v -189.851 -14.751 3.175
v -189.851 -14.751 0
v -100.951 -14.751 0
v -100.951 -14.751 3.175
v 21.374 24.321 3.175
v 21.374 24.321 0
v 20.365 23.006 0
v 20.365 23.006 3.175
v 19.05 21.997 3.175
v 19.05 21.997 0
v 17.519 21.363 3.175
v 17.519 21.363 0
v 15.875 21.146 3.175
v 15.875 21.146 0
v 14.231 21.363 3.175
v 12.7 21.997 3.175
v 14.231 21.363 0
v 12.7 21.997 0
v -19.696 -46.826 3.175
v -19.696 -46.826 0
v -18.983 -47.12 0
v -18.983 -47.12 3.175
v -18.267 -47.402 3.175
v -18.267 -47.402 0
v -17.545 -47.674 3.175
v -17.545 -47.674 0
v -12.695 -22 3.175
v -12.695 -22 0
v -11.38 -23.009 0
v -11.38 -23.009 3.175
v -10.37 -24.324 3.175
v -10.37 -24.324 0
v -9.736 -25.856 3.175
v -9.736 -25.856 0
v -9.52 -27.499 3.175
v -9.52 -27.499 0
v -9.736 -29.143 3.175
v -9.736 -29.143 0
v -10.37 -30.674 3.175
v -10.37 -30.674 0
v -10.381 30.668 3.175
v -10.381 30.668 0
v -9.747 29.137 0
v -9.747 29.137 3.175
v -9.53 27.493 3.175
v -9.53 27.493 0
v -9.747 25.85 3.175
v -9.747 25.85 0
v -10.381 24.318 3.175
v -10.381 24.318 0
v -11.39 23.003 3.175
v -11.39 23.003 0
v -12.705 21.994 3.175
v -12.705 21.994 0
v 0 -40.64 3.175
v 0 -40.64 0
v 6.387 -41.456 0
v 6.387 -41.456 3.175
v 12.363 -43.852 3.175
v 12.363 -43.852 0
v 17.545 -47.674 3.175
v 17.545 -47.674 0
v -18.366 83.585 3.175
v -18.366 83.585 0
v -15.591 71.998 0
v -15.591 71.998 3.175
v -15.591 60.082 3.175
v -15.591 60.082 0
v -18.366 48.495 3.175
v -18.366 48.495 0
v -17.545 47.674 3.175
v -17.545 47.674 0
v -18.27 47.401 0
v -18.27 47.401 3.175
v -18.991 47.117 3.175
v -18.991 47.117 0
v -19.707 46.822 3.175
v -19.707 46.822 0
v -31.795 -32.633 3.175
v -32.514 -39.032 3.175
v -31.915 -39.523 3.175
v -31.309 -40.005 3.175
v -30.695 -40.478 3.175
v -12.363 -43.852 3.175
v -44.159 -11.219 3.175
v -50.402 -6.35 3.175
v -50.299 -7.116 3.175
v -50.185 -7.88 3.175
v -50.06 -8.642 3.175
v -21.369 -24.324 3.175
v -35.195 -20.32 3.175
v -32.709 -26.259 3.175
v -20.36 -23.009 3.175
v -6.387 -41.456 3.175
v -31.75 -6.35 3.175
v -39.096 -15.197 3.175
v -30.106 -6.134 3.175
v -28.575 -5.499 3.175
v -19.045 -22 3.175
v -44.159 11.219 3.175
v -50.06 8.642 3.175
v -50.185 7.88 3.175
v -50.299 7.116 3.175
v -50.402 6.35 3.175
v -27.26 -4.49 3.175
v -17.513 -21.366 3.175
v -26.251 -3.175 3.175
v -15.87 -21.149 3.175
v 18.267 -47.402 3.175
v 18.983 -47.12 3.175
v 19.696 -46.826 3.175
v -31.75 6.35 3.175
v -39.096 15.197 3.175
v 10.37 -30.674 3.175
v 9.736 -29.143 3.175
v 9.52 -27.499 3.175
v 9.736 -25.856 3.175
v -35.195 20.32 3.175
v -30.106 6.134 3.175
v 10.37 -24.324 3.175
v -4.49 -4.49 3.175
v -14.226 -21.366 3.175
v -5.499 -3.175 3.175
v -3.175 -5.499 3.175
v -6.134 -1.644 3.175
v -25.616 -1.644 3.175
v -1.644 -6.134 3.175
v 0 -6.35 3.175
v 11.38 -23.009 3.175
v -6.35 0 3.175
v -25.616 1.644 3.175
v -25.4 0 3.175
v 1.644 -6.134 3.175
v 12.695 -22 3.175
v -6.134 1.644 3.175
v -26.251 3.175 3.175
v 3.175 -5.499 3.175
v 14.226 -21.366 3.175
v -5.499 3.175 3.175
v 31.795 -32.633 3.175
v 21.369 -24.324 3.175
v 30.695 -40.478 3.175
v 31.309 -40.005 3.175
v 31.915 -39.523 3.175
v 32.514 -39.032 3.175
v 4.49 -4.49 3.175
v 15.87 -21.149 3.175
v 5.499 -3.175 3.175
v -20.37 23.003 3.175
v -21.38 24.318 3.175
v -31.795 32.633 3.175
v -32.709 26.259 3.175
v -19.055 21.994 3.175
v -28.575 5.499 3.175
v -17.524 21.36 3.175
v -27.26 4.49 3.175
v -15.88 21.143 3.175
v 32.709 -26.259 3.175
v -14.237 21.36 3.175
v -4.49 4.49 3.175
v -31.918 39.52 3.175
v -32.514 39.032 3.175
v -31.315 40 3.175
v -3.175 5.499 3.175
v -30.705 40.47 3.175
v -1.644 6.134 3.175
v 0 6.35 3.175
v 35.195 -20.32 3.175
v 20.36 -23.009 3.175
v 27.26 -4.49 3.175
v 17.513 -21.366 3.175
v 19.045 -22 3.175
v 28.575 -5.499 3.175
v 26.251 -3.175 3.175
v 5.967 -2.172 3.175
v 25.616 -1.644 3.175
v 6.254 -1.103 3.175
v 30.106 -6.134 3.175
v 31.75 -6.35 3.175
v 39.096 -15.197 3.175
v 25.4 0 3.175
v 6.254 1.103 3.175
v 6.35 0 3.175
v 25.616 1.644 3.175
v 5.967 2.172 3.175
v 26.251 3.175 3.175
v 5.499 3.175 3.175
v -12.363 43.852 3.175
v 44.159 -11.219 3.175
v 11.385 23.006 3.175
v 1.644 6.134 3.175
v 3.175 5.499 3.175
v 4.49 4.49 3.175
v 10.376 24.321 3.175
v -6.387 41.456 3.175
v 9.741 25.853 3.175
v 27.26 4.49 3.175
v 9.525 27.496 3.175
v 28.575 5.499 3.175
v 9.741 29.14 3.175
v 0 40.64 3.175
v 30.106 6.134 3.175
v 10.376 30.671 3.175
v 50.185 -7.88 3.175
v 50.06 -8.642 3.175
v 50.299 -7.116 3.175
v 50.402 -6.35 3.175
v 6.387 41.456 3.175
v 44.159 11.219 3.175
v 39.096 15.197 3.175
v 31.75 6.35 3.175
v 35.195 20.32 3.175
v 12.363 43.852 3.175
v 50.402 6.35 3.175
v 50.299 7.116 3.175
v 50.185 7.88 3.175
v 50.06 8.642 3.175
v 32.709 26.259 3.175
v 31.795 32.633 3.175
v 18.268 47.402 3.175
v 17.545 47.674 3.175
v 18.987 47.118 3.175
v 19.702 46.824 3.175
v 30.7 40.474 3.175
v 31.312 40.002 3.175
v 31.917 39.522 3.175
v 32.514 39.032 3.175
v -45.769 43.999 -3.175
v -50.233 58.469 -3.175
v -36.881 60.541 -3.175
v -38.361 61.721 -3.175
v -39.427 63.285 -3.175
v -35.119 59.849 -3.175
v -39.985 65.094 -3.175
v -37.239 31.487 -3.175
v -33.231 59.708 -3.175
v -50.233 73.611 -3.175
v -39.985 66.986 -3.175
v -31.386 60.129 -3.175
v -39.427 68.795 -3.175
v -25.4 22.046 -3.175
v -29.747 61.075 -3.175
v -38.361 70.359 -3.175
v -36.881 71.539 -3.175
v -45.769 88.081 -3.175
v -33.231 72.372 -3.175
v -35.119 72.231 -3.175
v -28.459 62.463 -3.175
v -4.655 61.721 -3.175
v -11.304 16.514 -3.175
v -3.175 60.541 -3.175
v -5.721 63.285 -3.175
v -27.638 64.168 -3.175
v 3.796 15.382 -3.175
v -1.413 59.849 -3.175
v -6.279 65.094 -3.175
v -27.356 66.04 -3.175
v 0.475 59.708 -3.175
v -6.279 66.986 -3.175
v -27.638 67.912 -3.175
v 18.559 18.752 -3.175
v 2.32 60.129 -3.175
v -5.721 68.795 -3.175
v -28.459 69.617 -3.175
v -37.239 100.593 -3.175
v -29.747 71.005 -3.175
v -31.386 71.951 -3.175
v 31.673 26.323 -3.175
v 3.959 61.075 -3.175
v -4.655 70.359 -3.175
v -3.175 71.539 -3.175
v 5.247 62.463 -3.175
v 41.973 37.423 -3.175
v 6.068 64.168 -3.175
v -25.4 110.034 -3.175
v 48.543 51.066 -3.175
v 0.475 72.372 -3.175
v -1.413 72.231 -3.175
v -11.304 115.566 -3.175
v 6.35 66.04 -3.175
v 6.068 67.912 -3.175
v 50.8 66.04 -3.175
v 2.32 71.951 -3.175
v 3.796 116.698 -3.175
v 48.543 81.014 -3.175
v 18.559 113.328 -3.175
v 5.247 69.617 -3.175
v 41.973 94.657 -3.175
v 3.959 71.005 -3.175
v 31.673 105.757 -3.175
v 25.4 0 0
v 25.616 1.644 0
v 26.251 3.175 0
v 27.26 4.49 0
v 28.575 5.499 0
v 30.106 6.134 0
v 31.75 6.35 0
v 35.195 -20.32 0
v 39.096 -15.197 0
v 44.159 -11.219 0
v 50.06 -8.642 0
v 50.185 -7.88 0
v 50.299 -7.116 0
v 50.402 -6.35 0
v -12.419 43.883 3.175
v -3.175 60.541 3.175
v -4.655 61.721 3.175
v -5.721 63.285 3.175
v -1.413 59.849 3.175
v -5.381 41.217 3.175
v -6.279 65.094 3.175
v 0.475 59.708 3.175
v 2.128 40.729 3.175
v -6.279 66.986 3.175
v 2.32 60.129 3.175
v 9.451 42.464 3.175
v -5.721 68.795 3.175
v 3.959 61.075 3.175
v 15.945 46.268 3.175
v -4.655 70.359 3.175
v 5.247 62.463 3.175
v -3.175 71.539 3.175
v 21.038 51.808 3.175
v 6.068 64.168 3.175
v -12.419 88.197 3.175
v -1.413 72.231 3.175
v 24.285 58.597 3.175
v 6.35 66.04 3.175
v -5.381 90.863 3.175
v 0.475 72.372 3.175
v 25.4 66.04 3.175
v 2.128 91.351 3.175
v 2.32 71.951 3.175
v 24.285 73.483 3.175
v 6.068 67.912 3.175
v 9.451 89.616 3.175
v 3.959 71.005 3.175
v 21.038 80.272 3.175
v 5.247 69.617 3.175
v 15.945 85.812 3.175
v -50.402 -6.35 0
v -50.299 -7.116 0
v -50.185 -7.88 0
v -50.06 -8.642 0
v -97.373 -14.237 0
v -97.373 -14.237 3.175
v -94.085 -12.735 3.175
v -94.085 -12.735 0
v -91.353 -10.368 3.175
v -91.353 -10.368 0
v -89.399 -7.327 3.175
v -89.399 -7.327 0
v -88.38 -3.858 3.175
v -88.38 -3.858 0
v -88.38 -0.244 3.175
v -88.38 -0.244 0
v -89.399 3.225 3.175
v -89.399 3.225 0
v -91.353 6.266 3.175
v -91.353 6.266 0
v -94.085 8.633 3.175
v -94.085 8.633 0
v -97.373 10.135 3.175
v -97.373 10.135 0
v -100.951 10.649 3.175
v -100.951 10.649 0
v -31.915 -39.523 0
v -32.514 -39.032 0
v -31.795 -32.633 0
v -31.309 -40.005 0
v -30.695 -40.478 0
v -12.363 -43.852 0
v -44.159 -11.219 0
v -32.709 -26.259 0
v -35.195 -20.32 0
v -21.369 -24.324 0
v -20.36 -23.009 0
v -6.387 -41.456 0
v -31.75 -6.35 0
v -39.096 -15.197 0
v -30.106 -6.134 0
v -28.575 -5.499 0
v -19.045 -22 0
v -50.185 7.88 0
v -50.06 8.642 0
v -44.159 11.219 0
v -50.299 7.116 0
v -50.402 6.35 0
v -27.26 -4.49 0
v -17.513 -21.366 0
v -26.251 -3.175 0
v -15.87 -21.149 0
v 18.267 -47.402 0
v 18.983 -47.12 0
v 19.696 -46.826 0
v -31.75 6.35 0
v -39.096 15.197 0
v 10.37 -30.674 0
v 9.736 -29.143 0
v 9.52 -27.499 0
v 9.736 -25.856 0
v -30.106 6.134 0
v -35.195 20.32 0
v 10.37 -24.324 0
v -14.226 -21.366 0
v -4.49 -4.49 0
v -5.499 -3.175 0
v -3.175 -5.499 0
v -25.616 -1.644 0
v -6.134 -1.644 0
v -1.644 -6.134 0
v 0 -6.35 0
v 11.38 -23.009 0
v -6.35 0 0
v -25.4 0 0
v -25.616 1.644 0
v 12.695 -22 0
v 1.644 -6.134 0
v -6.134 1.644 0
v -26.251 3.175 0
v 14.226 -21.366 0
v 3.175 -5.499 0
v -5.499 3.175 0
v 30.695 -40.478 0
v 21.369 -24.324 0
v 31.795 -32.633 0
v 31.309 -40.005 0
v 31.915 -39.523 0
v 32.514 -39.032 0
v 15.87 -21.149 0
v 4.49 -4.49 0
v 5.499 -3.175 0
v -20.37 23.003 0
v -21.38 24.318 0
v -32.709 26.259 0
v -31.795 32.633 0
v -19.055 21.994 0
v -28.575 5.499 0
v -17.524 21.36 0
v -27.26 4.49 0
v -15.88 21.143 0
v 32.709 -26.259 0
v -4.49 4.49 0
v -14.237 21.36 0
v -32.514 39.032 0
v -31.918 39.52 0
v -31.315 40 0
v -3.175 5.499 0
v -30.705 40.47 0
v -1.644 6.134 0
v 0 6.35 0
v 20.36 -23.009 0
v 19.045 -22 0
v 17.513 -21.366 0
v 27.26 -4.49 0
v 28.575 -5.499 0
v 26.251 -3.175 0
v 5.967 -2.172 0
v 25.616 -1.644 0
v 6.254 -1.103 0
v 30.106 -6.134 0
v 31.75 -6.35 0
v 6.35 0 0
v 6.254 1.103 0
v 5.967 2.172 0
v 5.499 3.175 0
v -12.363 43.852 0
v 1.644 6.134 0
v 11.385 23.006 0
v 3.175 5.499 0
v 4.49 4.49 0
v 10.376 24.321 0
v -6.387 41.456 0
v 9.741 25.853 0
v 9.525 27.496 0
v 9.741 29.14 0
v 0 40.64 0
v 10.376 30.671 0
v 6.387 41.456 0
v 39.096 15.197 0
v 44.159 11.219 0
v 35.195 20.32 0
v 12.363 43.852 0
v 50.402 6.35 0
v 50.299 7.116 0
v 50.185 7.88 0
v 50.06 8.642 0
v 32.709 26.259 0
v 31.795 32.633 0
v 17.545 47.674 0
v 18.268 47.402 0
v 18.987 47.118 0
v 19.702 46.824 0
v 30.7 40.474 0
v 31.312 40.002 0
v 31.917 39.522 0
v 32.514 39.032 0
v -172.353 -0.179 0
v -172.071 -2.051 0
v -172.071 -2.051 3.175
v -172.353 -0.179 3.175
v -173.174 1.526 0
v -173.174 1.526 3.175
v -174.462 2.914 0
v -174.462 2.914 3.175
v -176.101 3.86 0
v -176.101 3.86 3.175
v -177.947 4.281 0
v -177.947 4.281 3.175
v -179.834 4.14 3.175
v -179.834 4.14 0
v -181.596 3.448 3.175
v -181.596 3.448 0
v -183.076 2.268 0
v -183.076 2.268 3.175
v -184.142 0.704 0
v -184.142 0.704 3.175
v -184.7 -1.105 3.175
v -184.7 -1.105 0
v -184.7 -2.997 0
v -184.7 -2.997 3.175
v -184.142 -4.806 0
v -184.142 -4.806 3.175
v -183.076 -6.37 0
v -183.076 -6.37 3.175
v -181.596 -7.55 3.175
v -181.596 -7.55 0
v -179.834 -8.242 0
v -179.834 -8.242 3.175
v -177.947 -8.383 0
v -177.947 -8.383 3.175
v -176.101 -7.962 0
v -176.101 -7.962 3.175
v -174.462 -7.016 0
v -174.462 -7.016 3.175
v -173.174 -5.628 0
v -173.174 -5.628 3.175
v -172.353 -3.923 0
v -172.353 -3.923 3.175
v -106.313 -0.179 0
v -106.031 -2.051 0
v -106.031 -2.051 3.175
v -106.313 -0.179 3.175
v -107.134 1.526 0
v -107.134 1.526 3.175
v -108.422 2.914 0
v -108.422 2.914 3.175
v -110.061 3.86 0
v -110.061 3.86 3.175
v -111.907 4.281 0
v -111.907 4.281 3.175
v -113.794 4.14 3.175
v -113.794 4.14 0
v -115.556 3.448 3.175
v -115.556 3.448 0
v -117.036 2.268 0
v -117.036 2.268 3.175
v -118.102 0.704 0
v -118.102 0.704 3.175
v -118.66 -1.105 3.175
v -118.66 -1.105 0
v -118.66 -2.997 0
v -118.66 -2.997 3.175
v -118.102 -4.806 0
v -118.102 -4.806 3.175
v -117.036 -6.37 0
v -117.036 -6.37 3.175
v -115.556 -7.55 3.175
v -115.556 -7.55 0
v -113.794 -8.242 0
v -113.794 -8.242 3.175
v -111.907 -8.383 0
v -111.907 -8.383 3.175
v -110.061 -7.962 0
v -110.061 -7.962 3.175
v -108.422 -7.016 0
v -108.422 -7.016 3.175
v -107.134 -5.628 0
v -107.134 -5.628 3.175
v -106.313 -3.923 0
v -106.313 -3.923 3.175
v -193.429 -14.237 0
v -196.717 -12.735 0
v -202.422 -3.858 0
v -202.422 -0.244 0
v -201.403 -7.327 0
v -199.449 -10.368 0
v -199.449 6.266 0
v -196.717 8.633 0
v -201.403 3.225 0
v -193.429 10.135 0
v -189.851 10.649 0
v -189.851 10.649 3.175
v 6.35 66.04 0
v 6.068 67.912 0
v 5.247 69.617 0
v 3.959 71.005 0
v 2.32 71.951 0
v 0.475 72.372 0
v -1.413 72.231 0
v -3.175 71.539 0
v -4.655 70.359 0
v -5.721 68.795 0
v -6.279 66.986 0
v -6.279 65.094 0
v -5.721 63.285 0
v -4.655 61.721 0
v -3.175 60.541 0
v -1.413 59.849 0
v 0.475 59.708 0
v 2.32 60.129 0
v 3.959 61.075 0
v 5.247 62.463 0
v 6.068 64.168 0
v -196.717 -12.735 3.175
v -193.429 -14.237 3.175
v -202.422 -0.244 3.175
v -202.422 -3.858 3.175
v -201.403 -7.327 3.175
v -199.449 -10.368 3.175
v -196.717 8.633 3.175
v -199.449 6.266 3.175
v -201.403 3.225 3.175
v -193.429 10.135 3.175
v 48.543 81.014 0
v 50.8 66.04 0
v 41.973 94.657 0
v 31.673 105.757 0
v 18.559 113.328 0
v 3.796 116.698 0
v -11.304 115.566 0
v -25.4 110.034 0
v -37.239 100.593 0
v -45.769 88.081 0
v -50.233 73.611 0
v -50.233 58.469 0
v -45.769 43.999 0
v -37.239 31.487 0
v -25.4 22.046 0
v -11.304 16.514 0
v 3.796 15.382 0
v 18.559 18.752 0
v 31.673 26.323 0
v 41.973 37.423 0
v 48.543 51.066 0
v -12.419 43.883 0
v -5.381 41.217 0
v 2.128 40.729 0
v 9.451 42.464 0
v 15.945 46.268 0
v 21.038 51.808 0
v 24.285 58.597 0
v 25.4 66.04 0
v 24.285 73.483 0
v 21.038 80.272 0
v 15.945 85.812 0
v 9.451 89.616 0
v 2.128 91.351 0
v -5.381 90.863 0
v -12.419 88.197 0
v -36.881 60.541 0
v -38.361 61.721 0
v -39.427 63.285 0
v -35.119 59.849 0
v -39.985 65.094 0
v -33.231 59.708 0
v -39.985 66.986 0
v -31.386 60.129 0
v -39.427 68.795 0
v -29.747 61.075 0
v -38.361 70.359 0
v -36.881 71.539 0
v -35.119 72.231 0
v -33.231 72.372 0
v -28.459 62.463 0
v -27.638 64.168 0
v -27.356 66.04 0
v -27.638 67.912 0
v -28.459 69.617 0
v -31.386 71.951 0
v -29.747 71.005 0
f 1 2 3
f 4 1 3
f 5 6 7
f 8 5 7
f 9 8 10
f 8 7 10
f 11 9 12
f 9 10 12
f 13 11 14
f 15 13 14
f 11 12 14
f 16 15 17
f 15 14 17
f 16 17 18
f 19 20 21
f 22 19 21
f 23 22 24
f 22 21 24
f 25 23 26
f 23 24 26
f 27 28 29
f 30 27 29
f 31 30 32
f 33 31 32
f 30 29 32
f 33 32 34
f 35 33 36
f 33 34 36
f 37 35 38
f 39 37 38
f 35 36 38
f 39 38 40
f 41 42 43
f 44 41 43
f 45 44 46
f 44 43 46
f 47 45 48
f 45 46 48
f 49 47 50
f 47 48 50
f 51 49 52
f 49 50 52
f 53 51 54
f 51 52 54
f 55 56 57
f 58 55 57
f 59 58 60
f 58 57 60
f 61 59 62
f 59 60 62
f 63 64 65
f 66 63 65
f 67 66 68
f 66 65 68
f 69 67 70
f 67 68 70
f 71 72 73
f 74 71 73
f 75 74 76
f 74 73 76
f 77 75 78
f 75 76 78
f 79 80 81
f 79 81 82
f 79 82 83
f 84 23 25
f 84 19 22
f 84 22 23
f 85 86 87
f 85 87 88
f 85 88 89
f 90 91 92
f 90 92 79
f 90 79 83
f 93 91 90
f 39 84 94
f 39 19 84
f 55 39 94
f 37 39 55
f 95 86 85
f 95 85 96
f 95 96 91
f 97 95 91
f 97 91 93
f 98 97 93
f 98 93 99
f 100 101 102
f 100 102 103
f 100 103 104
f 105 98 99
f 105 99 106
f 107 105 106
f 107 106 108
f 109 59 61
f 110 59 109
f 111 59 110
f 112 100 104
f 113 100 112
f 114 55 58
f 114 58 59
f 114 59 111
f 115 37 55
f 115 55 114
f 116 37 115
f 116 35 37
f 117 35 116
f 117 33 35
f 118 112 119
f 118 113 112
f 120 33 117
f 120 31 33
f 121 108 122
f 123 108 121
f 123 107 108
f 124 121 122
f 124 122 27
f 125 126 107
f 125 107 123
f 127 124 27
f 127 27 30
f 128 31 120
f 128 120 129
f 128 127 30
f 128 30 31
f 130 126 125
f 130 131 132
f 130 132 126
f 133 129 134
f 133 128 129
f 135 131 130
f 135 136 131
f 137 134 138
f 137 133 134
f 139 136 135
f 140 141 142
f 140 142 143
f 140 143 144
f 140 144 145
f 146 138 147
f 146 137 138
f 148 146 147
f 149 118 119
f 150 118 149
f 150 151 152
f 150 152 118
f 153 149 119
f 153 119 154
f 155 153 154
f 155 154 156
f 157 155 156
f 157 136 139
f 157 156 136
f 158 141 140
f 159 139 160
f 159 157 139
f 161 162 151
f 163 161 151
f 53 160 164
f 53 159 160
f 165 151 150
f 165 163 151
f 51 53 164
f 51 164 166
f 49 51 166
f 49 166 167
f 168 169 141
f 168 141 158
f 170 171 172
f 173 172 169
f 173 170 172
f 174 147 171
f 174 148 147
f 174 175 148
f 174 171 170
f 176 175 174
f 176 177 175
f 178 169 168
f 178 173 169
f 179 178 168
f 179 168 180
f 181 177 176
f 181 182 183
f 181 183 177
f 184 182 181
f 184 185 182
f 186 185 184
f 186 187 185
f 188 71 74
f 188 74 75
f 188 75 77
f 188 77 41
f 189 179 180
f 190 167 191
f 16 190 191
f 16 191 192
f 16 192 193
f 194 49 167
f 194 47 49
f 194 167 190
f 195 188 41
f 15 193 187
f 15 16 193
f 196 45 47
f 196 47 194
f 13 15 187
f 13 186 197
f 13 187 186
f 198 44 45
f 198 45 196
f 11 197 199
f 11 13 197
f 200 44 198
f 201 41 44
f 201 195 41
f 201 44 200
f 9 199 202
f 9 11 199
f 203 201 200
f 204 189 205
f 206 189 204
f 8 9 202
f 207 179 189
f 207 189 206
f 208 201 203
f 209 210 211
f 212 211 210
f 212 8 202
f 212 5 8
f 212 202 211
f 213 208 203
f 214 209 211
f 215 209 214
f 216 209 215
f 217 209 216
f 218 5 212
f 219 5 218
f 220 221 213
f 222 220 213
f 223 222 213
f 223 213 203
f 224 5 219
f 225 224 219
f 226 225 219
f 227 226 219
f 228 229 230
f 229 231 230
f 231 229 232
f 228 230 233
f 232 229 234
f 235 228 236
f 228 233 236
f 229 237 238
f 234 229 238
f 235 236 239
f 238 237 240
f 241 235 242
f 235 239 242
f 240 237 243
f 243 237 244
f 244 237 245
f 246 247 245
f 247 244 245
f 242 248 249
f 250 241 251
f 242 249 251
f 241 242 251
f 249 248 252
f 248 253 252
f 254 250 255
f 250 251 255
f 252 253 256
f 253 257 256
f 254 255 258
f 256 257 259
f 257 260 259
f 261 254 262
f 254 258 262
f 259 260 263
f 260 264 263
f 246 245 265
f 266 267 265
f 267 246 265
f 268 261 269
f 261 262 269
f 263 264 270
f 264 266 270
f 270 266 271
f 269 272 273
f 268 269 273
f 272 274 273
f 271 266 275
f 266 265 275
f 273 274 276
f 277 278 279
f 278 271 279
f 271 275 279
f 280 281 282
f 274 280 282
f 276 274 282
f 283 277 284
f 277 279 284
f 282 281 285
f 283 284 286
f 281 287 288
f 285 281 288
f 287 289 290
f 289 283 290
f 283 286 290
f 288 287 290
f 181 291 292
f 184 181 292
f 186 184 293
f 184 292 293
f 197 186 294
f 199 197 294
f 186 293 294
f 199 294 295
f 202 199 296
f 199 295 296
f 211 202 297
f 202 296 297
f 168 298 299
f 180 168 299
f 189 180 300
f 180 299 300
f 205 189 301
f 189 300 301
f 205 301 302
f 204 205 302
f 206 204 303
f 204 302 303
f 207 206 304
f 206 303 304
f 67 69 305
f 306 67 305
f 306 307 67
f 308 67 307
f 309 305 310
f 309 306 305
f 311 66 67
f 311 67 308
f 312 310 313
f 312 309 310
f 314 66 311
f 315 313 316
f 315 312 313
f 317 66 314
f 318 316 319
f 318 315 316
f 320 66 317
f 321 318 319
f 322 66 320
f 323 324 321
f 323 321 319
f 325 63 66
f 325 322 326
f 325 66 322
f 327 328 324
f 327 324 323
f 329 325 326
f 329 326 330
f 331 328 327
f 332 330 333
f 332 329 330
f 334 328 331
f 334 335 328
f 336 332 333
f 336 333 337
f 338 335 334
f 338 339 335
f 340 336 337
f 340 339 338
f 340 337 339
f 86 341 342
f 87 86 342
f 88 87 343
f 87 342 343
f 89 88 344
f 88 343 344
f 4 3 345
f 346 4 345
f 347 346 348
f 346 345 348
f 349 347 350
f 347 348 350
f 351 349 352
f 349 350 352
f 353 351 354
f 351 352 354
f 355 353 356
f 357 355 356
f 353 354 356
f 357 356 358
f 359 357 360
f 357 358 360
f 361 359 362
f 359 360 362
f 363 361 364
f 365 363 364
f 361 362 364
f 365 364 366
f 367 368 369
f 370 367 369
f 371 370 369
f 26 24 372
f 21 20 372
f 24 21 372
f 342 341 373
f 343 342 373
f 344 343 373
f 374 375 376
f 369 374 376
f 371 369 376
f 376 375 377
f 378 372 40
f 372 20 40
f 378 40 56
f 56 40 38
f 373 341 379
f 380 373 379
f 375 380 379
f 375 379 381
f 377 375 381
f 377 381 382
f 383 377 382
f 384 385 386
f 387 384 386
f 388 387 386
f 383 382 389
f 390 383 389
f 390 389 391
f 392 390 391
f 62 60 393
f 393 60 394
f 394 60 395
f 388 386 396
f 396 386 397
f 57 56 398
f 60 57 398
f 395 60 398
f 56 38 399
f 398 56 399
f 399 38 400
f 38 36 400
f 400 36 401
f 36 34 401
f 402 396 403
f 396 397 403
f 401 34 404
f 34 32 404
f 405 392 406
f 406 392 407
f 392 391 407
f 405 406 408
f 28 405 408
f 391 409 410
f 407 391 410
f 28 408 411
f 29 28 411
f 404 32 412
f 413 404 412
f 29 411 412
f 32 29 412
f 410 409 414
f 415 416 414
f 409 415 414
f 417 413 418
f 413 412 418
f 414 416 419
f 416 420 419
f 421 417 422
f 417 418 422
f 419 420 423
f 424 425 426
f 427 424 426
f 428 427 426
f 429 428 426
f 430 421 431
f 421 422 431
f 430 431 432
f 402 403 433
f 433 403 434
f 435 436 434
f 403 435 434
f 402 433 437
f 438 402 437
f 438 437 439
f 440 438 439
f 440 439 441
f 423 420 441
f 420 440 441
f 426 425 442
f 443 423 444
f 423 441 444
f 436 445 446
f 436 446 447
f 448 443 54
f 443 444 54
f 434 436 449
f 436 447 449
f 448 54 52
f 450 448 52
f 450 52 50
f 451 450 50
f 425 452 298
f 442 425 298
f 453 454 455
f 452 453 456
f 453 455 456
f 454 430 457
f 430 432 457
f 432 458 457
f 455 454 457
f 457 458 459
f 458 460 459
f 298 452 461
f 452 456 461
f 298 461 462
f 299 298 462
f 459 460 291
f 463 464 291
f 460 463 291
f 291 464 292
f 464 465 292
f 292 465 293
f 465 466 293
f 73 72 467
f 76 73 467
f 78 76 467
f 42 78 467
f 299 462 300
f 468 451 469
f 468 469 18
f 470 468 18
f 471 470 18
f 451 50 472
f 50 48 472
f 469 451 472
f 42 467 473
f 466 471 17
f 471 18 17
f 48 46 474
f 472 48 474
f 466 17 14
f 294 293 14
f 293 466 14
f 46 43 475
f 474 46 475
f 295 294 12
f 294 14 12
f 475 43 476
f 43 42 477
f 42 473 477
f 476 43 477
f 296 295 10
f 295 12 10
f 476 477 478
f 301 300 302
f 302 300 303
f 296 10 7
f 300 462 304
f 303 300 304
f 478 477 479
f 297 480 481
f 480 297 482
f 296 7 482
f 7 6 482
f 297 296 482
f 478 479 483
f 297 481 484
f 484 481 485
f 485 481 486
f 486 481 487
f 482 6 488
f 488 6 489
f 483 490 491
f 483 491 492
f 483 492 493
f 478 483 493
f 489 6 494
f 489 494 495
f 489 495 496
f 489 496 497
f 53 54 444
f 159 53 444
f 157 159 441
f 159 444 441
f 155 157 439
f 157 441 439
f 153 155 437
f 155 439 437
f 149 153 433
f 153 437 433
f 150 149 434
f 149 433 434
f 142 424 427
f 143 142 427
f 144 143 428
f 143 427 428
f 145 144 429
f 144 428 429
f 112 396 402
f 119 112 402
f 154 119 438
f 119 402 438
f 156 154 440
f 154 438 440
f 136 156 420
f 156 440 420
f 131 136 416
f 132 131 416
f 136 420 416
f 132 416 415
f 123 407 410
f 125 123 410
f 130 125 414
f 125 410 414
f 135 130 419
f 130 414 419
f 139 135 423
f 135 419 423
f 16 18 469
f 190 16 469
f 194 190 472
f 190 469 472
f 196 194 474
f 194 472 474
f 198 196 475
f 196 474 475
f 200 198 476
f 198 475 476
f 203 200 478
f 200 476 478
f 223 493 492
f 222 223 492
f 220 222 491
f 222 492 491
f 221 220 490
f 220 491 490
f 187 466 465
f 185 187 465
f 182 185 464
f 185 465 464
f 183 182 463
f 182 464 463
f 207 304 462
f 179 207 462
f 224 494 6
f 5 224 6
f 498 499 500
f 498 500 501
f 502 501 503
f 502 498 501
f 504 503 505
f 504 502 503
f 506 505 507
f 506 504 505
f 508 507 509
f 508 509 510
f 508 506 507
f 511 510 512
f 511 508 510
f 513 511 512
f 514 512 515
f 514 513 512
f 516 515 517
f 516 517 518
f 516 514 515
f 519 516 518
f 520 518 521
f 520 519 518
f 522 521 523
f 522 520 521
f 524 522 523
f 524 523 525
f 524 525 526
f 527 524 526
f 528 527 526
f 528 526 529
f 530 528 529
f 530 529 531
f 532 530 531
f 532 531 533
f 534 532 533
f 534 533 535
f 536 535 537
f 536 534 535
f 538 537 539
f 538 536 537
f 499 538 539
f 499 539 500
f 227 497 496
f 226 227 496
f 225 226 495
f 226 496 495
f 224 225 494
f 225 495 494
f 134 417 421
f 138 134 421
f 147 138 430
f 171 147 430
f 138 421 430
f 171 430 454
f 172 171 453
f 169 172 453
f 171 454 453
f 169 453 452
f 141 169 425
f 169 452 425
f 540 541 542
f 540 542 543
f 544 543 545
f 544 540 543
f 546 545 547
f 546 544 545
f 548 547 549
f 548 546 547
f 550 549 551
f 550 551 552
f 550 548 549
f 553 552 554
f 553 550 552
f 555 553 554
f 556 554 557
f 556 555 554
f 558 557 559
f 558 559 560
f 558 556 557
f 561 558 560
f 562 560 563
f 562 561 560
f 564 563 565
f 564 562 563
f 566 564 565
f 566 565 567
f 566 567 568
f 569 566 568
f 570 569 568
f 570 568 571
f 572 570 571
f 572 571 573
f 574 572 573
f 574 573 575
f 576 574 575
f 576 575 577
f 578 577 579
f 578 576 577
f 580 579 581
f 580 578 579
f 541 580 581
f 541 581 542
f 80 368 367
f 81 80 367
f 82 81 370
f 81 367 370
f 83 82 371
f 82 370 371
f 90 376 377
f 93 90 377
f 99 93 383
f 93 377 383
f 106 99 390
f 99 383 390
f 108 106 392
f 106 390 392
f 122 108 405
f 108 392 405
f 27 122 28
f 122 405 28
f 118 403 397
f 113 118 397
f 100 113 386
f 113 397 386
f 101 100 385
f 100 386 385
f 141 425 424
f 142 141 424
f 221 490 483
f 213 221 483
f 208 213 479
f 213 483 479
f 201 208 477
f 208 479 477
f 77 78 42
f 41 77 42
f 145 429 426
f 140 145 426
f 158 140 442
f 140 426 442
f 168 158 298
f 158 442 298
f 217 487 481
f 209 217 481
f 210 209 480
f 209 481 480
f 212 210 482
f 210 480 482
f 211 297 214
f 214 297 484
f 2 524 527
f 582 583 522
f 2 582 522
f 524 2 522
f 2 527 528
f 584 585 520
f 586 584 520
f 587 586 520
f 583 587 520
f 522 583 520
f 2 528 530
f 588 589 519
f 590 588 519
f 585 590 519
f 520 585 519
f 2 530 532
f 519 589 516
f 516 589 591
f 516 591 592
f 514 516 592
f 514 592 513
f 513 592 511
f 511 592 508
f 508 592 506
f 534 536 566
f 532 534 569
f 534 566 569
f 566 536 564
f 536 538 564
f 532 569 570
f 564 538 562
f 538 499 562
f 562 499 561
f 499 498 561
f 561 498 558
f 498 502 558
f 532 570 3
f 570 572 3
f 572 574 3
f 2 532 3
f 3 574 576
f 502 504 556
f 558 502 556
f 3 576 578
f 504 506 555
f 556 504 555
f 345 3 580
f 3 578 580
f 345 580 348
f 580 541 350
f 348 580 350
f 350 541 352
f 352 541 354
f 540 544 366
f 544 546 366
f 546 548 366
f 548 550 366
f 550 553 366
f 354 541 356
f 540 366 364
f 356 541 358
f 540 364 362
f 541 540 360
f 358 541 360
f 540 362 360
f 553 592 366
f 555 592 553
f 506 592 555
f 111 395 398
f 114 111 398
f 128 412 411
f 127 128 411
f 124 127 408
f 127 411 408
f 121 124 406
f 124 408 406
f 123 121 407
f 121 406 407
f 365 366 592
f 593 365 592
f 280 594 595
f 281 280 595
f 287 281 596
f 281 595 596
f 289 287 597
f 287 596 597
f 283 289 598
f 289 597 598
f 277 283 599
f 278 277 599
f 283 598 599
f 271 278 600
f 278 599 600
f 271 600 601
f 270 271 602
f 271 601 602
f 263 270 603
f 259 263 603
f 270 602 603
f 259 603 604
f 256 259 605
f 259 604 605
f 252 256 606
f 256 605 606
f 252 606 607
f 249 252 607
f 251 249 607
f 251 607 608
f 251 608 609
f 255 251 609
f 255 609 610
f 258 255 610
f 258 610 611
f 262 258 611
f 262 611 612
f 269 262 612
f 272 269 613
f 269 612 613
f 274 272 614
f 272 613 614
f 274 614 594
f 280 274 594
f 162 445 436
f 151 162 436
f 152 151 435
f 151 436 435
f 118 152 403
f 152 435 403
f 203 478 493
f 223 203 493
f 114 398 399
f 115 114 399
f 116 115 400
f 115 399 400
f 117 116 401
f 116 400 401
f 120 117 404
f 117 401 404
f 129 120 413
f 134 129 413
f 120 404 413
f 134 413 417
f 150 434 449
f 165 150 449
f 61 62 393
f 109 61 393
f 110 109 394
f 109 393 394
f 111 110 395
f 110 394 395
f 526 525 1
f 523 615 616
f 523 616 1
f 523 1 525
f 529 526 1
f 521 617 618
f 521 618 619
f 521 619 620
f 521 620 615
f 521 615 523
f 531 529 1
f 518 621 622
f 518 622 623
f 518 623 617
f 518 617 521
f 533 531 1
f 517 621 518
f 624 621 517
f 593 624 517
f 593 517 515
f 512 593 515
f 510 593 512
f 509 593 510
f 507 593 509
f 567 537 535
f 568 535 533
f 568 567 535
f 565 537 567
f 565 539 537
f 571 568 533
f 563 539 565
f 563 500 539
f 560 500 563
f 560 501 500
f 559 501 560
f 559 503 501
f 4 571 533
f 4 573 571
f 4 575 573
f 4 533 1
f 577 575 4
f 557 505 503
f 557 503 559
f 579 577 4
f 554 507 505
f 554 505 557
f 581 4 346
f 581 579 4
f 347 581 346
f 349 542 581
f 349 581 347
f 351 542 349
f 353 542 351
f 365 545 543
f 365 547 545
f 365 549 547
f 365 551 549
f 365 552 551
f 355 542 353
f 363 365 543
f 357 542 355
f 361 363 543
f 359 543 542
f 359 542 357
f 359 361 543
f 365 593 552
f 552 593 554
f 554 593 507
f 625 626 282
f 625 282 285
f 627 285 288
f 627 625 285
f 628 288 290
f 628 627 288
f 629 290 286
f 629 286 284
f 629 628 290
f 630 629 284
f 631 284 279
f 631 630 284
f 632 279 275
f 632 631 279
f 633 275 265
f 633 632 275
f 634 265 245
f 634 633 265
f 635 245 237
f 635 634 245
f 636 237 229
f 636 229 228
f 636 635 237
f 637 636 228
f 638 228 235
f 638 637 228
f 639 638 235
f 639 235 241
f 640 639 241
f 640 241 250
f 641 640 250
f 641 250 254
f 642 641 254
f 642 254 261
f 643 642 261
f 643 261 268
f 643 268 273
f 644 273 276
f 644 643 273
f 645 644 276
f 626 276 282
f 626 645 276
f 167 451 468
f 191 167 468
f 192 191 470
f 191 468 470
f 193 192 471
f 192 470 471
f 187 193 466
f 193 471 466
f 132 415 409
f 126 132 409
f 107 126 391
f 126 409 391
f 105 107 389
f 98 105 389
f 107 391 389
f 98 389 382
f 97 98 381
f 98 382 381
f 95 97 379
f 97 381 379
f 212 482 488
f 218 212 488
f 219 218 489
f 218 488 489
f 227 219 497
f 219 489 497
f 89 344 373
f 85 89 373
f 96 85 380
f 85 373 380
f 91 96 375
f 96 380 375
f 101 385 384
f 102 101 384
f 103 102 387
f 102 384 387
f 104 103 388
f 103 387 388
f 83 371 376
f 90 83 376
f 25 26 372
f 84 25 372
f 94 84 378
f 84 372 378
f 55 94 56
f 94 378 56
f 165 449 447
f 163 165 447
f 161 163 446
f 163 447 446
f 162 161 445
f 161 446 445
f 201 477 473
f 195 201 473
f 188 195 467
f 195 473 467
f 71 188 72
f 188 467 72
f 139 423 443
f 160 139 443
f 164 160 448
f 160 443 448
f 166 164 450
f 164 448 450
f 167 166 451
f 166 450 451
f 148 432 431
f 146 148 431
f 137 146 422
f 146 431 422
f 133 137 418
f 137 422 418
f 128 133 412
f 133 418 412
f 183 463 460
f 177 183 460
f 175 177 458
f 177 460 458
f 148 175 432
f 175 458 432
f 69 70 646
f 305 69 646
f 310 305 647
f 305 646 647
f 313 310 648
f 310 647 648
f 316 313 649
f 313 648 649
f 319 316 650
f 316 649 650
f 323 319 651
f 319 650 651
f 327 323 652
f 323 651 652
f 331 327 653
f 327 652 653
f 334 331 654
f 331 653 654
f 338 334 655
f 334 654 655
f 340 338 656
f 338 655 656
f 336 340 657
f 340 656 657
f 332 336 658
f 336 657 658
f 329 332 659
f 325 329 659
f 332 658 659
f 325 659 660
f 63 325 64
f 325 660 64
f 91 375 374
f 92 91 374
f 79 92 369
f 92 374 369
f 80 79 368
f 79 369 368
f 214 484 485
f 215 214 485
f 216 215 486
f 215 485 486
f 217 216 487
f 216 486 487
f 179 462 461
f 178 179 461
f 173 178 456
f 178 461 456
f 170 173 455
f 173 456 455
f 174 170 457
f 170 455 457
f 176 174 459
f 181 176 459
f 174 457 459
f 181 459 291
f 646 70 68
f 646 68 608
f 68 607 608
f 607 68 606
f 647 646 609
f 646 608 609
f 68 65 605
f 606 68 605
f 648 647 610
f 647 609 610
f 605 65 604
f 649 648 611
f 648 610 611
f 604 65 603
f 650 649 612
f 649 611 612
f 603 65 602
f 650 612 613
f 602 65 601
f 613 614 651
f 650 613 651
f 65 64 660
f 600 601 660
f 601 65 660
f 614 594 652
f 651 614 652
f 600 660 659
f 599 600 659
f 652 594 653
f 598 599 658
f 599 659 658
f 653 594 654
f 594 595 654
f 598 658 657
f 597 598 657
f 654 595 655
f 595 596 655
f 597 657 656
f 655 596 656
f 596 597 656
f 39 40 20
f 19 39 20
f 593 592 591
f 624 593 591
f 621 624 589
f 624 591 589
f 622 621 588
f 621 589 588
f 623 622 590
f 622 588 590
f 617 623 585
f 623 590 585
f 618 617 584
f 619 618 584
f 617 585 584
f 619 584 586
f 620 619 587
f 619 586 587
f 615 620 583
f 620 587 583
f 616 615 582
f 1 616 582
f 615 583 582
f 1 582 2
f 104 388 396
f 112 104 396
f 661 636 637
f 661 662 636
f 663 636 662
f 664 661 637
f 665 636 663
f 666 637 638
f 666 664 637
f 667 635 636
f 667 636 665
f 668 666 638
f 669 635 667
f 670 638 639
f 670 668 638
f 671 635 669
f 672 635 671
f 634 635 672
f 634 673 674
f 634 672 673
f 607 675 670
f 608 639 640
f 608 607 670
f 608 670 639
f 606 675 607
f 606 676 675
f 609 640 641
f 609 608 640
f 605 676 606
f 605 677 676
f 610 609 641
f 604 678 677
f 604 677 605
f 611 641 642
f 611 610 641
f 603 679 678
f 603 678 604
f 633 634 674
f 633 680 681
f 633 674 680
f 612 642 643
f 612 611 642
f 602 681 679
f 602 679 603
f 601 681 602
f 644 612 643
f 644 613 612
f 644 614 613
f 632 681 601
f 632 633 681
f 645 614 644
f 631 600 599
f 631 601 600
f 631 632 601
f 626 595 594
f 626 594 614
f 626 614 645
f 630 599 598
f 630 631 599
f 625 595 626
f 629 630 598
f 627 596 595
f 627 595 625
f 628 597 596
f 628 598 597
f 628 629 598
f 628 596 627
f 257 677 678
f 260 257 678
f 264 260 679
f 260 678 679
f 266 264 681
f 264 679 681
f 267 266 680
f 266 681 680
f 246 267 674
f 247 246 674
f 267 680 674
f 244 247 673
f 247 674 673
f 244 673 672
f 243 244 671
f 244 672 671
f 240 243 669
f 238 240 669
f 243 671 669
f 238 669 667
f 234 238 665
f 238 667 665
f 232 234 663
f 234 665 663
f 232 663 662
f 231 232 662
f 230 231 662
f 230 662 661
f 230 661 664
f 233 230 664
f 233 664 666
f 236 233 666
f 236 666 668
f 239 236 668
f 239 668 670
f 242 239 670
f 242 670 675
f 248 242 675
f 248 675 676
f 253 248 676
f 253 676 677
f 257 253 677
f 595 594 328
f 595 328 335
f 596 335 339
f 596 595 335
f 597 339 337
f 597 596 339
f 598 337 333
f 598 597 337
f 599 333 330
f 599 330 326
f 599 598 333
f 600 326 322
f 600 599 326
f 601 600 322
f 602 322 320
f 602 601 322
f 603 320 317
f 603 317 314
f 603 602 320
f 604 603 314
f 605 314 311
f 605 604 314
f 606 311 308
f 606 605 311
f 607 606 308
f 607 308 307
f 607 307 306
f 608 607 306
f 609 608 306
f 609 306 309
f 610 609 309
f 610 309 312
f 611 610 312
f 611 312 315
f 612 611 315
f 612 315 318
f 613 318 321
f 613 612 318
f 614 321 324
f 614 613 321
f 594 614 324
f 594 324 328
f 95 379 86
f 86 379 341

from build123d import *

# Parameters (mm, degrees)
F1_DEPTH = 3.175
F2_R     = 50.8
F2_R_2   = 6.35
F3_DEPTH = 3.175
F4_R     = 6.35
F5_DEPTH = 3.175
F6_R     = 6.35
F7_DEPTH = 3.175
F8_DEPTH = 3.176


with BuildPart() as f1:
    # F0 (on Top) → F1 (new body)
    with BuildSketch(Plane.XY):
        with BuildLine():
            Line((0, 40.64), (0, 6.35))
            ThreePointArc((0, 6.35), (3.175, 5.499261), (5.499261, 3.175))
            Line((5.499261, 3.175), (35.195272, 20.32))
            ThreePointArc((35.195272, 20.32), (32.049136, 29.417168), (32.514014, 39.031767))
            ThreePointArc((32.514014, 39.031767), (31.615254, 39.763246), (30.700043, 40.474033))
            Line((30.700043, 40.474033), (21.374261, 24.321307))
            Line((21.374261, 24.321307), (18.199261, 18.822045))
            Line((18.199261, 18.822045), (12.7, 21.997045))
            Line((12.7, 21.997045), (7.200739, 25.172045))
            Line((7.200739, 25.172045), (10.375739, 30.671307))
            Line((10.375739, 30.671307), (19.70152, 46.824033))
            ThreePointArc((19.70152, 46.824033), (18.628354, 47.261236), (17.545495, 47.673846))
            ThreePointArc((17.545495, 47.673846), (9.451447, 42.46395), (0, 40.64))
        make_face()
        with BuildLine():
            ThreePointArc((-32.514014, 39.031767), (-32.049136, 29.417168), (-35.195272, 20.32))
            Line((-35.195272, 20.32), (-5.499261, 3.175))
            ThreePointArc((-5.499261, 3.175), (-3.175, 5.499261), (0, 6.35))
            Line((0, 6.35), (0, 40.64))
            ThreePointArc((0, 40.64), (-9.451447, 42.46395), (-17.545495, 47.673846))
            ThreePointArc((-17.545495, 47.673846), (-18.631204, 47.260113), (-19.707167, 46.821657))
            Line((-19.707167, 46.821657), (-10.381003, 30.668267))
            Line((-10.381003, 30.668267), (-7.206003, 25.169006))
            Line((-7.206003, 25.169006), (-12.705265, 21.994006))
            Line((-12.705265, 21.994006), (-18.204526, 18.819006))
            Line((-18.204526, 18.819006), (-21.379526, 24.318267))
            Line((-21.379526, 24.318267), (-30.704924, 40.470331))
            ThreePointArc((-30.704924, 40.470331), (-31.617652, 39.761339), (-32.514014, 39.031767))
        make_face()
        with BuildLine():
            ThreePointArc((-35.195272, 20.32), (-41.500582, 13.046782), (-50.059509, 8.642079))
            ThreePointArc((-50.059509, 8.642079), (-50.243608, 7.49799), (-50.401562, 6.35))
            Line((-50.401562, 6.35), (-31.75, 6.35))
            Line((-31.75, 6.35), (-25.4, 6.35))
            Line((-25.4, 6.35), (-25.4, 0))
            Line((-25.4, 0), (-25.4, -6.35))
            Line((-25.4, -6.35), (-31.75, -6.35))
            Line((-31.75, -6.35), (-50.401562, -6.35))
            ThreePointArc((-50.401562, -6.35), (-50.243608, -7.49799), (-50.059509, -8.642079))
            ThreePointArc((-50.059509, -8.642079), (-41.500582, -13.046782), (-35.195272, -20.32))
            Line((-35.195272, -20.32), (-5.499261, -3.175))
            ThreePointArc((-5.499261, -3.175), (-6.35, 0), (-5.499261, 3.175))
            Line((-5.499261, 3.175), (-35.195272, 20.32))
        make_face()
        with BuildLine():
            ThreePointArc((0, -6.35), (-3.175, -5.499261), (-5.499261, -3.175))
            Line((-5.499261, -3.175), (-35.195272, -20.32))
            ThreePointArc((-35.195272, -20.32), (-32.049136, -29.417168), (-32.514014, -39.031767))
            ThreePointArc((-32.514014, -39.031767), (-31.612856, -39.765152), (-30.695161, -40.477736))
            Line((-30.695161, -40.477736), (-21.368997, -24.324346))
            Line((-21.368997, -24.324346), (-18.193997, -18.825085))
            Line((-18.193997, -18.825085), (-12.694736, -22.000085))
            Line((-12.694736, -22.000085), (-7.195474, -25.175085))
            Line((-7.195474, -25.175085), (-10.370474, -30.674346))
            Line((-10.370474, -30.674346), (-19.695872, -46.826409))
            ThreePointArc((-19.695872, -46.826409), (-18.625504, -47.262359), (-17.545495, -47.673846))
            ThreePointArc((-17.545495, -47.673846), (-9.451447, -42.46395), (0, -40.64))
            Line((0, -40.64), (0, -6.35))
        make_face()
        with BuildLine():
            Line((35.195272, -20.32), (5.499261, -3.175))
            ThreePointArc((5.499261, -3.175), (3.175, -5.499261), (0, -6.35))
            Line((0, -6.35), (0, -40.64))
            ThreePointArc((0, -40.64), (9.451447, -42.46395), (17.545495, -47.673846))
            ThreePointArc((17.545495, -47.673846), (18.625504, -47.262359), (19.695872, -46.826409))
            Line((19.695872, -46.826409), (10.370474, -30.674346))
            Line((10.370474, -30.674346), (7.195474, -25.175085))
            Line((7.195474, -25.175085), (12.694735, -22.000085))
            Line((12.694735, -22.000085), (18.193997, -18.825085))
            Line((18.193997, -18.825085), (21.368997, -24.324346))
            Line((21.368997, -24.324346), (30.695161, -40.477736))
            ThreePointArc((30.695161, -40.477736), (31.612856, -39.765152), (32.514014, -39.031767))
            ThreePointArc((32.514014, -39.031767), (32.049136, -29.417168), (35.195272, -20.32))
        make_face()
        with BuildLine():
            Line((35.195272, 20.32), (5.499261, 3.175))
            ThreePointArc((5.499261, 3.175), (6.133629, 1.643501), (6.35, 0))
            ThreePointArc((6.35, 0), (6.133629, -1.643501), (5.499261, -3.175))
            Line((5.499261, -3.175), (35.195272, -20.32))
            ThreePointArc((35.195272, -20.32), (41.500582, -13.046782), (50.059509, -8.642079))
            ThreePointArc((50.059509, -8.642079), (50.243608, -7.49799), (50.401562, -6.35))
            Line((50.401562, -6.35), (31.75, -6.35))
            Line((31.75, -6.35), (25.4, -6.35))
            Line((25.4, -6.35), (25.4, 0))
            Line((25.4, 0), (25.4, 6.35))
            Line((25.4, 6.35), (31.75, 6.35))
            Line((31.75, 6.35), (50.401562, 6.35))
            ThreePointArc((50.401562, 6.35), (50.243608, 7.49799), (50.059509, 8.642079))
            ThreePointArc((50.059509, 8.642079), (41.500582, 13.046782), (35.195272, 20.32))
        make_face()
        with BuildLine():
            Line((-25.4, 6.35), (-31.75, 6.35))
            ThreePointArc((-31.75, 6.35), (-27.259872, 4.490128), (-25.4, 0))
            Line((-25.4, 0), (-25.4, 6.35))
        make_face()
        with BuildLine():
            Line((-25.4, -6.35), (-25.4, 0))
            ThreePointArc((-25.4, 0), (-27.259872, -4.490128), (-31.75, -6.35))
            Line((-31.75, -6.35), (-25.4, -6.35))
        make_face()
        with BuildLine():
            ThreePointArc((-12.705265, 21.994006), (-17.523765, 21.359638), (-21.379526, 24.318267))
            Line((-21.379526, 24.318267), (-18.204526, 18.819006))
            Line((-18.204526, 18.819006), (-12.705265, 21.994006))
        make_face()
        with BuildLine():
            ThreePointArc((-10.381003, 30.668267), (-9.746635, 25.849766), (-12.705265, 21.994006))
            Line((-12.705265, 21.994006), (-7.206003, 25.169006))
            Line((-7.206003, 25.169006), (-10.381003, 30.668267))
        make_face()
        with BuildLine():
            ThreePointArc((12.7, 21.997045), (9.741371, 25.852806), (10.375739, 30.671307))
            Line((10.375739, 30.671307), (7.200739, 25.172045))
            Line((7.200739, 25.172045), (12.7, 21.997045))
        make_face()
        with BuildLine():
            Line((18.199261, 18.822045), (21.374261, 24.321307))
            ThreePointArc((21.374261, 24.321307), (17.518501, 21.362678), (12.7, 21.997045))
            Line((12.7, 21.997045), (18.199261, 18.822045))
        make_face()
        with BuildLine():
            ThreePointArc((25.4, 0), (27.259872, 4.490128), (31.75, 6.35))
            Line((31.75, 6.35), (25.4, 6.35))
            Line((25.4, 6.35), (25.4, 0))
        make_face()
        with BuildLine():
            Line((25.4, -6.35), (31.75, -6.35))
            ThreePointArc((31.75, -6.35), (27.259872, -4.490128), (25.4, 0))
            Line((25.4, 0), (25.4, -6.35))
        make_face()
        with BuildLine():
            ThreePointArc((12.694735, -22.000085), (17.513236, -21.365717), (21.368997, -24.324346))
            Line((21.368997, -24.324346), (18.193997, -18.825085))
            Line((18.193997, -18.825085), (12.694735, -22.000085))
        make_face()
        with BuildLine():
            Line((7.195474, -25.175085), (10.370474, -30.674346))
            ThreePointArc((10.370474, -30.674346), (9.736107, -25.855845), (12.694735, -22.000085))
            Line((12.694735, -22.000085), (7.195474, -25.175085))
        make_face()
        with BuildLine():
            ThreePointArc((-12.694736, -22.000085), (-9.736107, -25.855845), (-10.370474, -30.674346))
            Line((-10.370474, -30.674346), (-7.195474, -25.175085))
            Line((-7.195474, -25.175085), (-12.694736, -22.000085))
        make_face()
        with BuildLine():
            Line((-18.193997, -18.825085), (-21.368997, -24.324346))
            ThreePointArc((-21.368997, -24.324346), (-17.513237, -21.365717), (-12.694736, -22.000085))
            Line((-12.694736, -22.000085), (-18.193997, -18.825085))
        make_face()
    extrude(amount=F1_DEPTH)


with BuildPart() as f3:
    # F2 (on Top) → F3 (new body)
    with BuildSketch(Plane.XY):
        with Locations((0, 66.04)):
            Circle(F2_R)
        with Locations((0, 66.04)):
            Circle(F2_R_2, mode=Mode.SUBTRACT)
    extrude(amount=-F3_DEPTH)

    # F4 (on face) → F8 (cut, through all)
    with BuildSketch(Plane.XY):
        with Locations((-33.7058, 66.04)):
            Circle(F4_R)
    extrude(amount=-F8_DEPTH, mode=Mode.SUBTRACT)


with BuildPart() as f5:
    # F4 (on face) → F5 (new body)
    with BuildSketch(Plane.XY):
        with BuildLine():
            ThreePointArc((-18.366154, 83.585495), (-15.24, 66.04), (-18.366154, 48.494505))
            ThreePointArc((-18.366154, 48.494505), (25.4, 66.04), (-18.366154, 83.585495))
        make_face()
        with Locations((0, 66.04)):
            Circle(F4_R, mode=Mode.SUBTRACT)
    extrude(amount=F5_DEPTH)


with BuildPart() as f7:
    # F6 (on Top) → F7 (new body)
    with BuildSketch(Plane.XY):
        with BuildLine():
            ThreePointArc((-189.851099, 10.648969), (-202.551099, -2.051031), (-189.851099, -14.751031))
            Line((-189.851099, -14.751031), (-100.951099, -14.751031))
            ThreePointArc((-100.951099, -14.751031), (-88.251099, -2.051031), (-100.951099, 10.648969))
            Line((-100.951099, 10.648969), (-189.851099, 10.648969))
        make_face()
        with Locations((-178.421099, -2.051031)):
            Circle(F6_R, mode=Mode.SUBTRACT)
        with Locations((-112.381099, -2.051031)):
            Circle(F6_R, mode=Mode.SUBTRACT)
    extrude(amount=F7_DEPTH)


solid = Compound([f1.part, f3.part, f5.part, f7.part])
